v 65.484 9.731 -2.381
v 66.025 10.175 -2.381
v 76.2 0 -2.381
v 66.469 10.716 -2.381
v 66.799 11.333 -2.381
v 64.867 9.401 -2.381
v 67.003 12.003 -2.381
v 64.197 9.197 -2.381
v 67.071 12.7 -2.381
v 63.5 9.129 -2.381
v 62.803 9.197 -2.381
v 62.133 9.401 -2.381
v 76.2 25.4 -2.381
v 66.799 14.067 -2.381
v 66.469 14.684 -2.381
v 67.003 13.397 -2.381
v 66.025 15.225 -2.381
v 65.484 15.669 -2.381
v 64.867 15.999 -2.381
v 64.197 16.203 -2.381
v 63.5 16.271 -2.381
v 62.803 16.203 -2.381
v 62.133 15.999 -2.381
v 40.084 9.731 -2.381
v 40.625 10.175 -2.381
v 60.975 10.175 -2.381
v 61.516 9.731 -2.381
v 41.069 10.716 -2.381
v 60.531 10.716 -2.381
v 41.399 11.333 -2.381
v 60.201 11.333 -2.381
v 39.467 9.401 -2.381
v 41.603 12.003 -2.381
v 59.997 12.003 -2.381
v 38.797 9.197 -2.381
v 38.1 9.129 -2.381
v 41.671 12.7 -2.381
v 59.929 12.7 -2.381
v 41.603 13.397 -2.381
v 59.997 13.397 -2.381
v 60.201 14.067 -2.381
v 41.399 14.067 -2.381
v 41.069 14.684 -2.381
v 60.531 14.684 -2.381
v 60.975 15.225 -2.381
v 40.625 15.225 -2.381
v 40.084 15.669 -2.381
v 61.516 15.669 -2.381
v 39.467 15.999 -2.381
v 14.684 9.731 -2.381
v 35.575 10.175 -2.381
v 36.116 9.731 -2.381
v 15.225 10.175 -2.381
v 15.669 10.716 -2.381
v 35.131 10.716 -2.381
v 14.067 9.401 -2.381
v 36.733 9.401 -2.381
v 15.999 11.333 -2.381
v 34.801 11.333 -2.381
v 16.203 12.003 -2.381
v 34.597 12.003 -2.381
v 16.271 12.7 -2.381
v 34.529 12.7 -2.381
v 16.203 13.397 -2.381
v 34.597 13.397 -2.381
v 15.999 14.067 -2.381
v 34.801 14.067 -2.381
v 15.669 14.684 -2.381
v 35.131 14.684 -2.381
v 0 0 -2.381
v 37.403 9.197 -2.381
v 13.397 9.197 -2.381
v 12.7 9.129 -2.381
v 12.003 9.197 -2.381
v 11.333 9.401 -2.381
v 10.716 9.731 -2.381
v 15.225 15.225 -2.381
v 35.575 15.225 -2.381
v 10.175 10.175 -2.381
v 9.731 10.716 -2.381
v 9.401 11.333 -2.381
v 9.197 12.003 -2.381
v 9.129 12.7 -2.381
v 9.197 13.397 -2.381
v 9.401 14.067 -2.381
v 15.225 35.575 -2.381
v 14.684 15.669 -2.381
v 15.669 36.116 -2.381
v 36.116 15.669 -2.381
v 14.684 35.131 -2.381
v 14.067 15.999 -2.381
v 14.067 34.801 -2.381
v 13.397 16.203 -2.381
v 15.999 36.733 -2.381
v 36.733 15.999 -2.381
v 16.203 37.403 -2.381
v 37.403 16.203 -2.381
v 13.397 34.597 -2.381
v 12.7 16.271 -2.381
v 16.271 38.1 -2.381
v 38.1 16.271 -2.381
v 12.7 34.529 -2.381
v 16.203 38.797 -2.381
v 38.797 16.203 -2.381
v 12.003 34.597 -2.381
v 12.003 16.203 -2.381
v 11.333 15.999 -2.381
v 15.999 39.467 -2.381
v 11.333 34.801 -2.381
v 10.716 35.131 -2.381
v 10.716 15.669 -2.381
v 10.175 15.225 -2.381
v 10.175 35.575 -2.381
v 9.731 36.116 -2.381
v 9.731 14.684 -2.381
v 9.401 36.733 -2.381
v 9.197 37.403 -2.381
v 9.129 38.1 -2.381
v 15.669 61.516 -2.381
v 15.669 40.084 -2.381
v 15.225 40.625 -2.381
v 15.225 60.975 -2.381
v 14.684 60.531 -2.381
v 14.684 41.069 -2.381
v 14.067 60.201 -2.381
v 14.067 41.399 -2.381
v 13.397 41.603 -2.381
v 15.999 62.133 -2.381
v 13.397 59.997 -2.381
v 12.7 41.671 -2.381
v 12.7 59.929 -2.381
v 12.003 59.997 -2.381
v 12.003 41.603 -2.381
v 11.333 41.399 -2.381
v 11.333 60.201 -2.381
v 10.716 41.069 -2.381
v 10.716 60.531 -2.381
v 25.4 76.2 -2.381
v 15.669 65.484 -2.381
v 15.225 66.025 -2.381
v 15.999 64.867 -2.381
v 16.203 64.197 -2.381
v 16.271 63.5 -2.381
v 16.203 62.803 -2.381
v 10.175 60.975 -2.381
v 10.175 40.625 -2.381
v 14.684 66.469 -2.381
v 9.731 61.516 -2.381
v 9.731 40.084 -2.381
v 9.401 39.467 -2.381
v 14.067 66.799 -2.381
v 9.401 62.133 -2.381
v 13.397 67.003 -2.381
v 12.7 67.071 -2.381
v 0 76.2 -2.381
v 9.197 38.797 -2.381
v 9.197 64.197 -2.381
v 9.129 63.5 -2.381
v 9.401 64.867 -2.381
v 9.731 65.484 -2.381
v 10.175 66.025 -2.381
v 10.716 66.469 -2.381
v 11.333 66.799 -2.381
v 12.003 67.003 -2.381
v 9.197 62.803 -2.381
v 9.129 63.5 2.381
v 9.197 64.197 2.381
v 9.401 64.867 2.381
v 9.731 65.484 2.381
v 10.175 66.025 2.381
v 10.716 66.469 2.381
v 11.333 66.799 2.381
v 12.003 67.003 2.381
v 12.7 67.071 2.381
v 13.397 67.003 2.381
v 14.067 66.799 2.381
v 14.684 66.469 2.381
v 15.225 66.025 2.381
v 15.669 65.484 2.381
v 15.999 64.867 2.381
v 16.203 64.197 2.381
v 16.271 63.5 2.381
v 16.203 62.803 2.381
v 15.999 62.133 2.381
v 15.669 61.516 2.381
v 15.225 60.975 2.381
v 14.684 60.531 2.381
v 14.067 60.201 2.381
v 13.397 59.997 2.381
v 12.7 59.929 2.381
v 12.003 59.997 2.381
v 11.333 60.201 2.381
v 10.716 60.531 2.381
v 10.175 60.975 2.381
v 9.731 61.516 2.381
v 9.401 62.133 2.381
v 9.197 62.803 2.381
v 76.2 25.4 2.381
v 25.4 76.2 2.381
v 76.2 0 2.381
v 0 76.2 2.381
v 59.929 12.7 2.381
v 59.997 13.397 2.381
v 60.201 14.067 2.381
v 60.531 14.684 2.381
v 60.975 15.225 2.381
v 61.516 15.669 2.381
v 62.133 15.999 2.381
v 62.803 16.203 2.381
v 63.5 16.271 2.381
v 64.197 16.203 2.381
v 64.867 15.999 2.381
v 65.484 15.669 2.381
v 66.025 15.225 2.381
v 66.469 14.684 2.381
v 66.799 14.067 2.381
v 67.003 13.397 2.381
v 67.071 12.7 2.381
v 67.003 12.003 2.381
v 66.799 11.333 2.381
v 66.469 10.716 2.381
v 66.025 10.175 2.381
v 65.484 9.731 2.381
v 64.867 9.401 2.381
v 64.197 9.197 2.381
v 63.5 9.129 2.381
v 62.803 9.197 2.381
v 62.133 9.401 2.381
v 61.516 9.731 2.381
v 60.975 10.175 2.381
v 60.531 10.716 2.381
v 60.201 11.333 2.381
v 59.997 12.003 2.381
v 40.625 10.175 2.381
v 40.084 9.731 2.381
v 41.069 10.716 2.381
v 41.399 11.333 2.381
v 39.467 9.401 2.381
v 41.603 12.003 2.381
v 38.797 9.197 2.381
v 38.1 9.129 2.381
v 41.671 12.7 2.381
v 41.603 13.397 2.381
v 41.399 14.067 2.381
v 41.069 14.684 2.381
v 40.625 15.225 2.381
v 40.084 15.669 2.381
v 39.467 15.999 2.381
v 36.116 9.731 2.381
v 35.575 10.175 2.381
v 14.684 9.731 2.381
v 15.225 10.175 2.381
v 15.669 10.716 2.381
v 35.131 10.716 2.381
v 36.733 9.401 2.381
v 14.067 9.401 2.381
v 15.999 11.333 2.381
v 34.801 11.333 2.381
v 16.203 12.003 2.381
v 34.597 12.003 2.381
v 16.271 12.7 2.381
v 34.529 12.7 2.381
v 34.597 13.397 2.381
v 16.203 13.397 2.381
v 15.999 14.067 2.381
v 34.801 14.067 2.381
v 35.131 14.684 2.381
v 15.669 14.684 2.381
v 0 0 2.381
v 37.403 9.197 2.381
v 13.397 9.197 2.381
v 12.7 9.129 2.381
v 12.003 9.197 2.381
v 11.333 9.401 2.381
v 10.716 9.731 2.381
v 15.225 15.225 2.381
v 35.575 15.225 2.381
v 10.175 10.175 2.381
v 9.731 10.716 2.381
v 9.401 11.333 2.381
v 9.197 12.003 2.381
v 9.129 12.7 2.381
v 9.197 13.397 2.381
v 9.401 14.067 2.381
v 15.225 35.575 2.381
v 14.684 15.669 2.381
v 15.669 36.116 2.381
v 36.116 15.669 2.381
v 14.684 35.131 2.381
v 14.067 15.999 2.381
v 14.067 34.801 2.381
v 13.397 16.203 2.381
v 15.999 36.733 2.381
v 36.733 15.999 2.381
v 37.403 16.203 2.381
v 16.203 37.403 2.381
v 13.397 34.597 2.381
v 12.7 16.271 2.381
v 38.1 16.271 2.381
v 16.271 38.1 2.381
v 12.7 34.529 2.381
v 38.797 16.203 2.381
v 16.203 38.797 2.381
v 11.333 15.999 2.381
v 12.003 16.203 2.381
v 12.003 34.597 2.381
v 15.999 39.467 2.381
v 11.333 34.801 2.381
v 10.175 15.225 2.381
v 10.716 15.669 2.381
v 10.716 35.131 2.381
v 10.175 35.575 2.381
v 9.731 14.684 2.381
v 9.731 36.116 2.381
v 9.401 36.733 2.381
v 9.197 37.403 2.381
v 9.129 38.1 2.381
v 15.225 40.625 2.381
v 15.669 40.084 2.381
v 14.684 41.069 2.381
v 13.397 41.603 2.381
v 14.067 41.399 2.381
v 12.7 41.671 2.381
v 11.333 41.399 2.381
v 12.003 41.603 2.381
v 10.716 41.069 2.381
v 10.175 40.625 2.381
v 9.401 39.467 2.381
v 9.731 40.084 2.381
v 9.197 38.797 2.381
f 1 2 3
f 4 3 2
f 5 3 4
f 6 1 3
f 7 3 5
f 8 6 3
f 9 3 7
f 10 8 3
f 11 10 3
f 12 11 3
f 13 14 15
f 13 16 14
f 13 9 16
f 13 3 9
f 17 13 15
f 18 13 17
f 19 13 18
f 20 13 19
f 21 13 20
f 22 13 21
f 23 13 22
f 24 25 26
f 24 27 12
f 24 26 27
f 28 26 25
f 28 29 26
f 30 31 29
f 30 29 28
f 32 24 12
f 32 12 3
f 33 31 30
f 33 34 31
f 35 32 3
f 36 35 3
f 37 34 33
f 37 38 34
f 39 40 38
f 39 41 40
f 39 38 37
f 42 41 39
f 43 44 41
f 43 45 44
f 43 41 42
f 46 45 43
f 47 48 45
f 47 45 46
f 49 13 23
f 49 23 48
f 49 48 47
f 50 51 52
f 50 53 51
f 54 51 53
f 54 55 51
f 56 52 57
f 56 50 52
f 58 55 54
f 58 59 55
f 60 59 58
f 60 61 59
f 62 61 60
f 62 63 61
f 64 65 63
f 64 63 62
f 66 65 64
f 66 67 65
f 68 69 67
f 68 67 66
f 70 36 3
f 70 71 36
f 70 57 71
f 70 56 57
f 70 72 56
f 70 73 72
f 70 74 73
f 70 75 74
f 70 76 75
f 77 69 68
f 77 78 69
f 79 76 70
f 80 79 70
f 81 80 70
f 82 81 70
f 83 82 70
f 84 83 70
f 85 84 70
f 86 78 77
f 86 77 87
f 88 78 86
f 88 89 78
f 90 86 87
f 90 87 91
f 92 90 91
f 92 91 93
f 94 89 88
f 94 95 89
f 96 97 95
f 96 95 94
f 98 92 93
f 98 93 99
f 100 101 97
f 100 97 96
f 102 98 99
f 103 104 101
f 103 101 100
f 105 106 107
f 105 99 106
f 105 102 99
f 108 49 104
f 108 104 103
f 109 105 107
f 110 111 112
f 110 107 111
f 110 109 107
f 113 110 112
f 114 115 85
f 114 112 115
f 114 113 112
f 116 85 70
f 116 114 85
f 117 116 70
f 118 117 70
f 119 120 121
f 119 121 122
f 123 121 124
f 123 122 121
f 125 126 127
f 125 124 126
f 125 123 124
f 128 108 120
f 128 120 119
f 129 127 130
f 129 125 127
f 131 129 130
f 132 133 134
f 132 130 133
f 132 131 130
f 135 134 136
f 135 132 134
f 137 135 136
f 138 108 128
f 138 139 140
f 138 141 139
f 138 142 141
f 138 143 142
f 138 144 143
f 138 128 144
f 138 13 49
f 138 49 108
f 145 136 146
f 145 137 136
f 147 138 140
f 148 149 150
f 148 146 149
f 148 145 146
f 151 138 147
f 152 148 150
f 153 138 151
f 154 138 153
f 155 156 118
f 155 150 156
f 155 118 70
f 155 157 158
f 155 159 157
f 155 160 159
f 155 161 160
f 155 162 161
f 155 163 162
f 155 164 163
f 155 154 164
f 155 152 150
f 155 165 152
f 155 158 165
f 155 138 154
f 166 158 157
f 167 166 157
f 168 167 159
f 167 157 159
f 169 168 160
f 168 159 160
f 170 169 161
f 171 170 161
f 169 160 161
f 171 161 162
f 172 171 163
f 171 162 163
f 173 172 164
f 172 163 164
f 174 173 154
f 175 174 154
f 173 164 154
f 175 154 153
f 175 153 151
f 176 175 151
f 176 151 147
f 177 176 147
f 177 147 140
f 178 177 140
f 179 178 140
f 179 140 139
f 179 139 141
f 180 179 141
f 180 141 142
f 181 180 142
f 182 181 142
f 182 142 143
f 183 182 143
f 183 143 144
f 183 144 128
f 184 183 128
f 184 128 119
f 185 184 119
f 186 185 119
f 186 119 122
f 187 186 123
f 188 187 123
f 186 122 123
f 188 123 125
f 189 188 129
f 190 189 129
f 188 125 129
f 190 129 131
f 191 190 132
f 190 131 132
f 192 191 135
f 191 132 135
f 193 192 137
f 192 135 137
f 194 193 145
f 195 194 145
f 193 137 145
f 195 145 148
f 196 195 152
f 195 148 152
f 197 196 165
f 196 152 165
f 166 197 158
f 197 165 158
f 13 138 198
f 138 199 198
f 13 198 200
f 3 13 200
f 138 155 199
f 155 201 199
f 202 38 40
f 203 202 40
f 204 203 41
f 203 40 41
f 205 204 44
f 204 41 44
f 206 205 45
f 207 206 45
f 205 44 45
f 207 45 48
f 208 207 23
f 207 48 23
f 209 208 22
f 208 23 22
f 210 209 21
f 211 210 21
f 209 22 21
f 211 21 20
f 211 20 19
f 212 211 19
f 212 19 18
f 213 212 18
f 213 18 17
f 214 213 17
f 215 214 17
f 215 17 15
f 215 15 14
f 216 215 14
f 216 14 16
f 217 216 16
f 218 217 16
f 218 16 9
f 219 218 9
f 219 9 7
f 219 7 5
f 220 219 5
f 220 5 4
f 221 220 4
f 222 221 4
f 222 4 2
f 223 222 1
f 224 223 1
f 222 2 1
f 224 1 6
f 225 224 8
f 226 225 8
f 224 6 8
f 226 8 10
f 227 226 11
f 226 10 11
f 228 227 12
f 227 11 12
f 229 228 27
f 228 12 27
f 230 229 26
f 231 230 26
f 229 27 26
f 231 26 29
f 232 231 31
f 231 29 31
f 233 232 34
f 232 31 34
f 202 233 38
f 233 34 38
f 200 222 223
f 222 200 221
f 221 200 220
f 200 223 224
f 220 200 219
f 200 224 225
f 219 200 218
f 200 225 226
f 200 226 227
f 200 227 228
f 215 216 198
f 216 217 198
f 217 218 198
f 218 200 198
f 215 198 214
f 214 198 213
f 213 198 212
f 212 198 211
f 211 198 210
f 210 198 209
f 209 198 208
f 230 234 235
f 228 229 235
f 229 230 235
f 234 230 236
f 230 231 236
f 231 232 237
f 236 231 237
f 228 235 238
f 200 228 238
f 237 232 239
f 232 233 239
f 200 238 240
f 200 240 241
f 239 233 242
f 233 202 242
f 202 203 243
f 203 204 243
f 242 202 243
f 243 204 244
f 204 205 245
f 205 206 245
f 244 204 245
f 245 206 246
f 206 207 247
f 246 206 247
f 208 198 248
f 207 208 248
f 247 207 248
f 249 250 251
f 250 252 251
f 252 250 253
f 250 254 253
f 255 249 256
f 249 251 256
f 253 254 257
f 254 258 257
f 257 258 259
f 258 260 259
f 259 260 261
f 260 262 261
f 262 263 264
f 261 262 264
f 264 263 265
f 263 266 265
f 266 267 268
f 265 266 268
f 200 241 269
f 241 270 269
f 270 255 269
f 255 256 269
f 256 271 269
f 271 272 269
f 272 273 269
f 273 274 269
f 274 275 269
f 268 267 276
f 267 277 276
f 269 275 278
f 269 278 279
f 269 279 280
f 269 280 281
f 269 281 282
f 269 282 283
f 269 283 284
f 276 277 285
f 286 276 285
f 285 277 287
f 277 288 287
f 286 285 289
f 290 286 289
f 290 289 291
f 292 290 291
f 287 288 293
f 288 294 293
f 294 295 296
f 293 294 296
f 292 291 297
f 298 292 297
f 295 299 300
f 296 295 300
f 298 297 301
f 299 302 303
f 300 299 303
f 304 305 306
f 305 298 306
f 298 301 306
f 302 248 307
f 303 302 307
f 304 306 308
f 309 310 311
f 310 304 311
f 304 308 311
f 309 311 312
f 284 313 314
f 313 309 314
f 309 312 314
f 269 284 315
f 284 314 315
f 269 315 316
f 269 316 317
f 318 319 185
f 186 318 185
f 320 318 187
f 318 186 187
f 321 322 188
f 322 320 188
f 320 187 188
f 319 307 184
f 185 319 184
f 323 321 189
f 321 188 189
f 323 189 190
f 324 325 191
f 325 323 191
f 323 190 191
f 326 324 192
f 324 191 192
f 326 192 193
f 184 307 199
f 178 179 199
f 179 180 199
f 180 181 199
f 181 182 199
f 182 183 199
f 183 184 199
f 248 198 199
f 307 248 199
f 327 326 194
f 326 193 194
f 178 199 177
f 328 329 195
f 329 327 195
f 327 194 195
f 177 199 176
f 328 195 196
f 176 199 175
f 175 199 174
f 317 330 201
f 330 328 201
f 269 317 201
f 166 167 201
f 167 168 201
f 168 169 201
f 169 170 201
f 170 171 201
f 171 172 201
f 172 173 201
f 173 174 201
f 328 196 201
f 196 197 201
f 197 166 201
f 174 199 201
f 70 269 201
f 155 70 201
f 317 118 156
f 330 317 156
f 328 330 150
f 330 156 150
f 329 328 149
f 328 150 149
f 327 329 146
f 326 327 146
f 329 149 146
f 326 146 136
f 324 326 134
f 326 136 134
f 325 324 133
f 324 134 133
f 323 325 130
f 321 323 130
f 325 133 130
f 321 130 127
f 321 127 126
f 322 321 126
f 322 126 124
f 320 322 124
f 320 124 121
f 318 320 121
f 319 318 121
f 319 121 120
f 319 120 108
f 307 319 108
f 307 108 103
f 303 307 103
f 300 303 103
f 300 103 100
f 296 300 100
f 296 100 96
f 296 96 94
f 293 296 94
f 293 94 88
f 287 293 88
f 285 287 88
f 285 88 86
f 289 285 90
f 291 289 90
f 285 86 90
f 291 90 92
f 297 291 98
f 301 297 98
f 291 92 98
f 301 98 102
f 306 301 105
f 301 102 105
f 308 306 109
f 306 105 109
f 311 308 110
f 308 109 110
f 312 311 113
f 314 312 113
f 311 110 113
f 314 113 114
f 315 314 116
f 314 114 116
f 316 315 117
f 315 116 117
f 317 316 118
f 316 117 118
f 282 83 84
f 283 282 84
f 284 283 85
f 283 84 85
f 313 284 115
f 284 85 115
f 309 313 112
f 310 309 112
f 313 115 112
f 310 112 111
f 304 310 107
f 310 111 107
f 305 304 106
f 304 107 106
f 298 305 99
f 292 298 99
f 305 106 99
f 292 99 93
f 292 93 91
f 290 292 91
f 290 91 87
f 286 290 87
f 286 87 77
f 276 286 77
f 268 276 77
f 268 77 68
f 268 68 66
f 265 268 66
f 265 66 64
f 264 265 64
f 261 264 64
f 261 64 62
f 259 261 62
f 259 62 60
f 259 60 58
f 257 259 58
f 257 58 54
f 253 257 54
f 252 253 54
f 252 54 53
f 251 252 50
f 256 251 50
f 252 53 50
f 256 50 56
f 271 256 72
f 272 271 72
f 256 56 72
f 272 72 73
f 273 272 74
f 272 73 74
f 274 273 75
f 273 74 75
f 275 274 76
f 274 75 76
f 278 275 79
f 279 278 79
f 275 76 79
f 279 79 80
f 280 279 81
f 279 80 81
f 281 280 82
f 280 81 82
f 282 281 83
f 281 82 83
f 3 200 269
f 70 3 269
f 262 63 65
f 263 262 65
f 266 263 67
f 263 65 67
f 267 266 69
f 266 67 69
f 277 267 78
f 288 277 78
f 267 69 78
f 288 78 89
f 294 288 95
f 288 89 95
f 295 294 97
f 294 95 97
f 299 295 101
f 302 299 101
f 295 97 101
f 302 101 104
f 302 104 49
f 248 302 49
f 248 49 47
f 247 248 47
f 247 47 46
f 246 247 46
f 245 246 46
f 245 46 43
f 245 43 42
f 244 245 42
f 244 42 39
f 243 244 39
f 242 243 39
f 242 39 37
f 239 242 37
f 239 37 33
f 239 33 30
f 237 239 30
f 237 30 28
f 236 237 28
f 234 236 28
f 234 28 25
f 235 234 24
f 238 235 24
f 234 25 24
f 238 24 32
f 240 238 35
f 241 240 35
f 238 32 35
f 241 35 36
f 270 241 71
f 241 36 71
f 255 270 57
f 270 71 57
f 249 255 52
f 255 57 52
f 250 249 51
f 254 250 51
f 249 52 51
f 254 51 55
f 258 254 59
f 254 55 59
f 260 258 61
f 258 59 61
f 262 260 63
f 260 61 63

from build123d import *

# Parameters (mm, degrees)
SKETCH1_R               = 3.2639
BOSS_EXTRUDE1_DEPTH     = 2.38125
F_1_4_CLEARANCE_HOLE1_D = 7.14248


with BuildPart() as part:
    # Sketch1 → Boss-Extrude1 (new, symmetric)
    with BuildSketch(Plane.XY):
        Polygon((0, 0), (0, 76.2), (25.4, 76.2), (76.2, 25.4), (76.2, 0), align=None)
        with Locations(Location((12.7, 12.7, 0), (0, 0, 180))):
            Circle(SKETCH1_R, mode=Mode.SUBTRACT)
        with Locations(Location((38.1, 12.7, 0), (0, 0, 180))):
            Circle(SKETCH1_R, mode=Mode.SUBTRACT)
        with Locations(Location((63.5, 12.7, 0), (0, 0, 180))):
            Circle(SKETCH1_R, mode=Mode.SUBTRACT)
        with Locations(Location((12.7, 38.1, 0), (0, 0, 180))):
            Circle(SKETCH1_R, mode=Mode.SUBTRACT)
        with Locations(Location((12.7, 63.5, 0), (0, 0, 180))):
            Circle(SKETCH1_R, mode=Mode.SUBTRACT)
    extrude(amount=BOSS_EXTRUDE1_DEPTH, both=True)

    # 1/4 Clearance Hole1 (through all)
    with Locations(Plane.XY.offset(2.38125)):
        with Locations((12.7, 63.5), (12.7, 38.1), (12.7, 12.7), (38.1, 12.7), (63.5, 12.7)):
            Hole(F_1_4_CLEARANCE_HOLE1_D / 2)


solid = part.part
